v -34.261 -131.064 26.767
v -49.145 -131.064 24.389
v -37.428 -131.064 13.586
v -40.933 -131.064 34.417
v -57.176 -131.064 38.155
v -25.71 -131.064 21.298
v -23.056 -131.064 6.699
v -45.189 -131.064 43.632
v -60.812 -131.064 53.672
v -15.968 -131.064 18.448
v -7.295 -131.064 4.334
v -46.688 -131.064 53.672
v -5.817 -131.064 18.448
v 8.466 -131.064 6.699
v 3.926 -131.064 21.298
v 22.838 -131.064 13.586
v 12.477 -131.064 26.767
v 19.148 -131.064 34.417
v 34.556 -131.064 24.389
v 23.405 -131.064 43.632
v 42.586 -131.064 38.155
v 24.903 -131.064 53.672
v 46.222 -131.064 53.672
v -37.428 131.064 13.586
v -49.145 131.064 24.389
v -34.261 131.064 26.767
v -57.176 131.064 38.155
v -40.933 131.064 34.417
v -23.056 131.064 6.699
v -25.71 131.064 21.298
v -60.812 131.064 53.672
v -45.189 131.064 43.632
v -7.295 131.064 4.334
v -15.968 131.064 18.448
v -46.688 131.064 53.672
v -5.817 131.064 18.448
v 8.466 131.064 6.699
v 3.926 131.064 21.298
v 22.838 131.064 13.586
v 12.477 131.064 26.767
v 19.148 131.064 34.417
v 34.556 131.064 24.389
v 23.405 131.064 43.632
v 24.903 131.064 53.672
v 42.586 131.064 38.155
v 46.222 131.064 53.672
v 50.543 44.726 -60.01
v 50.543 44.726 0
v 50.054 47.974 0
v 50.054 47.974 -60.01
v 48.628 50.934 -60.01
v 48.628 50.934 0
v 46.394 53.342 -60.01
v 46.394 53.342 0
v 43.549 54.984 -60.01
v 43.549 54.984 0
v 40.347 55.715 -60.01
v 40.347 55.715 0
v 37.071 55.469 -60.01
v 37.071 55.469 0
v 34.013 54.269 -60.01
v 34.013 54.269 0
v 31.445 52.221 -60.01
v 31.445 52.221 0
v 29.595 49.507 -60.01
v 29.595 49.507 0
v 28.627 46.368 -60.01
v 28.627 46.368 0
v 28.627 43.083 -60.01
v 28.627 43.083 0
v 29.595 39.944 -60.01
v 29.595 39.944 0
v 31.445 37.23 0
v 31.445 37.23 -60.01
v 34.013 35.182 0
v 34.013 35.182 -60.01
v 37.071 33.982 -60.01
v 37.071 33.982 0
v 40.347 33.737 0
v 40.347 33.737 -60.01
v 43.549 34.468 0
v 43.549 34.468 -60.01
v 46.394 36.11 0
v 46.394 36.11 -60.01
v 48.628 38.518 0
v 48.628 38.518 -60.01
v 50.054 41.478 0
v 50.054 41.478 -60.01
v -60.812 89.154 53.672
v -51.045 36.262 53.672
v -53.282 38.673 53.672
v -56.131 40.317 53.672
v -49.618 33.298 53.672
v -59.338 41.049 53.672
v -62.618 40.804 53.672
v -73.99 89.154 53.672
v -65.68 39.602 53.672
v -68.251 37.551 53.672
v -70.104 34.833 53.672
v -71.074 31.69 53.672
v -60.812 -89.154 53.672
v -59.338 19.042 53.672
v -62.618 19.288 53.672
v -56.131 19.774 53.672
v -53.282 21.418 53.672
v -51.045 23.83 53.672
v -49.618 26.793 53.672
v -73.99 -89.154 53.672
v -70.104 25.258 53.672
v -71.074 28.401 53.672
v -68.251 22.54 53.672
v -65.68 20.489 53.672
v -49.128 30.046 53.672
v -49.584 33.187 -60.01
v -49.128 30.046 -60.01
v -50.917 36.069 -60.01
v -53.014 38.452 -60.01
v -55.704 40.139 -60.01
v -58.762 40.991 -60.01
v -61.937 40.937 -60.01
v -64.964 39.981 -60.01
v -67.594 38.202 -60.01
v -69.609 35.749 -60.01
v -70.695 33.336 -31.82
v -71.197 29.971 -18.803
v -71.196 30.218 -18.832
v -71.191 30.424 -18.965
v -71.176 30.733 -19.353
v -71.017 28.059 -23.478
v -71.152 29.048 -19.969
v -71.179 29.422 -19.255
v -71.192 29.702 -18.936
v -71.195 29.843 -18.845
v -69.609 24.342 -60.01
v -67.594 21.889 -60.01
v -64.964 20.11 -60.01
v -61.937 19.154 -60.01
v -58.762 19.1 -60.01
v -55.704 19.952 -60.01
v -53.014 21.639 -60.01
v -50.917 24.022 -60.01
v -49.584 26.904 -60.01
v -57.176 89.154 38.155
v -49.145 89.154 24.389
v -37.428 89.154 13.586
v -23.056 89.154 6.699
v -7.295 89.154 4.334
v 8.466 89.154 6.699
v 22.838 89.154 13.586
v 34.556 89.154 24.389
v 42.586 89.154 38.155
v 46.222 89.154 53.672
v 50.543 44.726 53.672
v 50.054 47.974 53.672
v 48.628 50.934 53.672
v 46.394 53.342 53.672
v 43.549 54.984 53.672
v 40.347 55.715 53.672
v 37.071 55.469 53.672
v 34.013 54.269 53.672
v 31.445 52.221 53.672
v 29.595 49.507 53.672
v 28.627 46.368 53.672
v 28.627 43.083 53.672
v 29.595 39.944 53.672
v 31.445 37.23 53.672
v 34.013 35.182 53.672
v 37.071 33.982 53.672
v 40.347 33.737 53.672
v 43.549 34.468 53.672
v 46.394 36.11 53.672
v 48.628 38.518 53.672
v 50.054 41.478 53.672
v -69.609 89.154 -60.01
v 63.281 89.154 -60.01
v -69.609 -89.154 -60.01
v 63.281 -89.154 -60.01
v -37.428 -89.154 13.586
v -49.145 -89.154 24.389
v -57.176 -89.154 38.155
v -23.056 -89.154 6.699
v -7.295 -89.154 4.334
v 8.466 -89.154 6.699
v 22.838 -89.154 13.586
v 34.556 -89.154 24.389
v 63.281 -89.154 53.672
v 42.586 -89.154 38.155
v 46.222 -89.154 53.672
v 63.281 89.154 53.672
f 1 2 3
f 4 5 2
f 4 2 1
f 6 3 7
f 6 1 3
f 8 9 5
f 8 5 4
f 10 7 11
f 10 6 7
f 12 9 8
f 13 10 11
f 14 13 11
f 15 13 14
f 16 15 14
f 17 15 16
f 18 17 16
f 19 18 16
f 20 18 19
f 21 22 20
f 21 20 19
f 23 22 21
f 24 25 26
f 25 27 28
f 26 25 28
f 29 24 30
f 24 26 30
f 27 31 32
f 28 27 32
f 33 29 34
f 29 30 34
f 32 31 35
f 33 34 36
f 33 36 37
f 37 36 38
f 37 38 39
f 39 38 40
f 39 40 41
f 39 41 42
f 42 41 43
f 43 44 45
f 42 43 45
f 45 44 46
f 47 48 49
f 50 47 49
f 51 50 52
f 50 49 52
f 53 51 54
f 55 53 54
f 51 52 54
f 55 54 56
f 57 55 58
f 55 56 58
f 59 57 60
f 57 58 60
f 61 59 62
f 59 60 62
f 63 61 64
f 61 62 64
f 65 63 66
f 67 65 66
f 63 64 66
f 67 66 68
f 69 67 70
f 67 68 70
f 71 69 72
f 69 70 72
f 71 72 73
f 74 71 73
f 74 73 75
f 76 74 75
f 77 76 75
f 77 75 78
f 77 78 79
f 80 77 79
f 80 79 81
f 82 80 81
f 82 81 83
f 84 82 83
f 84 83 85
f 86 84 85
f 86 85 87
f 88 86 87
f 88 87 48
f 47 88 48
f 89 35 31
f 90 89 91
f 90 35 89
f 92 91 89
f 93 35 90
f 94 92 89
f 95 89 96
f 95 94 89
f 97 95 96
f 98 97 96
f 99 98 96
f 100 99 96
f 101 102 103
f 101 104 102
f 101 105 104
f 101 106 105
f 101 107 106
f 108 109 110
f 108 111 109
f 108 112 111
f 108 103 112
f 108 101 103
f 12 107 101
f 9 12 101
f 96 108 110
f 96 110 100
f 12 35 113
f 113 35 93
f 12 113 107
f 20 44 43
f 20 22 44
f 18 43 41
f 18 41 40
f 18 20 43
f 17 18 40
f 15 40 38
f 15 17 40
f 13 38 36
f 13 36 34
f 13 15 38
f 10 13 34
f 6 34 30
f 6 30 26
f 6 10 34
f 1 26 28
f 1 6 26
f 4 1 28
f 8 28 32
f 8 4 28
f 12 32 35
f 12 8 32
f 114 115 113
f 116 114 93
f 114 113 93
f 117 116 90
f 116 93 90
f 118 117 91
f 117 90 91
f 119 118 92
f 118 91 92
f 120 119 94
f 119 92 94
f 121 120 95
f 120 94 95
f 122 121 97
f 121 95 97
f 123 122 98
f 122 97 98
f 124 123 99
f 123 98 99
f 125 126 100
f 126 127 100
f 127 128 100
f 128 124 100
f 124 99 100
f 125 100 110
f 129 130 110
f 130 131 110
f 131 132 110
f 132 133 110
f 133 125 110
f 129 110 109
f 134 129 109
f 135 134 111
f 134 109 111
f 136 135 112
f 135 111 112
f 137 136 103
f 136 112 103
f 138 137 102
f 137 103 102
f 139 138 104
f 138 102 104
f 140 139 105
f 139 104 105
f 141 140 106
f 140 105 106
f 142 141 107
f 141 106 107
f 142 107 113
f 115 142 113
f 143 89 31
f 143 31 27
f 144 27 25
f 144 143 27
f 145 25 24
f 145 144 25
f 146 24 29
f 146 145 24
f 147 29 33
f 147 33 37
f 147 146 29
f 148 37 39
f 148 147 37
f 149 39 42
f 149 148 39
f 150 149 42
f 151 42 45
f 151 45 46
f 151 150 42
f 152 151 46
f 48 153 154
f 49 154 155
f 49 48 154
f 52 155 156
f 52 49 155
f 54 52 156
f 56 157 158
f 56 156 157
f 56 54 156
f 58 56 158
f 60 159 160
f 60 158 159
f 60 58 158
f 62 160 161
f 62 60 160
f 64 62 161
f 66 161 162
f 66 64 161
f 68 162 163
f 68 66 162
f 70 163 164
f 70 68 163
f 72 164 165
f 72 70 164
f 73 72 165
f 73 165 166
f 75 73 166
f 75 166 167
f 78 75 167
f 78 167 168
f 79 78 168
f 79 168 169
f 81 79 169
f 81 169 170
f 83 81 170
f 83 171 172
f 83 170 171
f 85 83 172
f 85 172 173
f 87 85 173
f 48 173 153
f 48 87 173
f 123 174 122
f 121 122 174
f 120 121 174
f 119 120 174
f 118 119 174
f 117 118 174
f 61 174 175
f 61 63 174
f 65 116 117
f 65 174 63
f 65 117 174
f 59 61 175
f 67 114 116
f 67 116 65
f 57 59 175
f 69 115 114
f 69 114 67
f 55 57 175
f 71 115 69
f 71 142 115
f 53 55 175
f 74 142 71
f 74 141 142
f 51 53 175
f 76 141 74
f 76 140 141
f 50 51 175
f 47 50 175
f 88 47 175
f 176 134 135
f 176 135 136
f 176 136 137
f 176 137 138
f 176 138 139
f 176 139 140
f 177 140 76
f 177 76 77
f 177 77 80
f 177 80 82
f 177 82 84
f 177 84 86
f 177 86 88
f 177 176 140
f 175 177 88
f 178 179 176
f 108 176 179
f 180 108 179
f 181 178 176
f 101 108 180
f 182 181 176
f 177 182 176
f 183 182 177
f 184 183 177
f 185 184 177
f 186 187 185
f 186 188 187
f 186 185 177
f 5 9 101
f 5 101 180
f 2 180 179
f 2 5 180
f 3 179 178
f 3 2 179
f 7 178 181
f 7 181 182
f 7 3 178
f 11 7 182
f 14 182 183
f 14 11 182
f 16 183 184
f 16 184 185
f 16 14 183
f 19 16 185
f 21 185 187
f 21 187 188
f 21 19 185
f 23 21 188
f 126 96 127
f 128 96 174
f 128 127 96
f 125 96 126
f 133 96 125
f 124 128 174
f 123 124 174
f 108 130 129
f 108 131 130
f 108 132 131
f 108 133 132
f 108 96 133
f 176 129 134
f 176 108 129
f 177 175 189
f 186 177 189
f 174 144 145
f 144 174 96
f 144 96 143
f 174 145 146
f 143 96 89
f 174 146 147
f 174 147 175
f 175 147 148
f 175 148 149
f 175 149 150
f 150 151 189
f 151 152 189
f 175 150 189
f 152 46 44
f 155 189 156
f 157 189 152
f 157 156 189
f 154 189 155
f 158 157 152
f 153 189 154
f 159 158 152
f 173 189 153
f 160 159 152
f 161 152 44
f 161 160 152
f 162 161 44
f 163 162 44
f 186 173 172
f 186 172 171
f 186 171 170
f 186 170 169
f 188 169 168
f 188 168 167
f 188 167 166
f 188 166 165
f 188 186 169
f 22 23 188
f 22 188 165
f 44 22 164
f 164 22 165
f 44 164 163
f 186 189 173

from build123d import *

# Parameters (mm, degrees)
F1_DEPTH = 89.154
F2_DEPTH = 131.064
F3_R     = 11.0199394835
F4_DEPTH = 25.4
F3_R_2   = 11.0346787259
F5_DEPTH = 138.938


with BuildPart() as f1:
    # F0 (on Front) → F1 (new body, symmetric)
    with BuildSketch(Plane.XZ):
        with BuildLine():
            Line((-73.9898234606, 53.6717362702), (-69.6088522673, -60.0099079311))
            Line((-69.6088522673, -60.0099079311), (63.2807761431, -60.0099079311))
            Line((63.2807761431, -60.0099079311), (63.2807761431, 53.6717362702))
            Line((63.2807761431, 53.6717362702), (46.2222844362, 53.6717362702))
            ThreePointArc((46.2222844362, 53.6717362702), (-7.294902578, 4.3339080113), (-60.8120895922, 53.6717362702))
            Line((-60.8120895922, 53.6717362702), (-73.9898234606, 53.6717362702))
        make_face()
        with BuildLine():
            Line((-46.6877035797, 53.6717362702), (-60.8120895922, 53.6717362702))
            ThreePointArc((-60.8120895922, 53.6717362702), (-7.294902578, 4.3339080113), (46.2222844362, 53.6717362702))
            Line((46.2222844362, 53.6717362702), (24.9031372368, 53.6717362702))
            ThreePointArc((24.9031372368, 53.6717362702), (-10.8922831714, 18.0866857546), (-46.6877035797, 53.6717362702))
        make_face()
    extrude(amount=F1_DEPTH, both=True)

    # F0 (on Front) → F2 (join, symmetric)
    with BuildSketch(Plane.XZ):
        with BuildLine():
            Line((-46.6877035797, 53.6717362702), (-60.8120895922, 53.6717362702))
            ThreePointArc((-60.8120895922, 53.6717362702), (-7.294902578, 4.3339080113), (46.2222844362, 53.6717362702))
            Line((46.2222844362, 53.6717362702), (24.9031372368, 53.6717362702))
            ThreePointArc((24.9031372368, 53.6717362702), (-10.8922831714, 18.0866857546), (-46.6877035797, 53.6717362702))
        make_face()
    extrude(amount=F2_DEPTH, both=True)


with BuildPart() as f4:
    # F3 (on Top) → F4 (new body)
    with BuildSketch(Plane.XY):
        with Locations((39.523396641, 44.7258390486)):
            Circle(F3_R)
    extrude(amount=F4_DEPTH)


with BuildPart() as f4b:
    # F3 (on Top) → F4, piece 2 (new body)
    with BuildSketch(Plane.XY):
        with Locations((-60.1624064147, 30.0455577672)):
            Circle(F3_R_2)
    extrude(amount=F4_DEPTH)


with BuildPart() as f5_tool:
    # F3 (on Top) → F5 (new body, symmetric)
    with BuildSketch(Plane.XY):
        with Locations((39.523396641, 44.7258390486)):
            Circle(F3_R)
        with Locations((-60.1624064147, 30.0455577672)):
            Circle(F3_R_2)
    extrude(amount=F5_DEPTH, both=True)


with BuildPart() as f1_1:
    add(f1.part)

    # F5: cut by f5_tool
    add(f5_tool.part, mode=Mode.SUBTRACT)


with BuildPart() as f4_1:
    add(f4.part)

    # F5: cut by f5_tool
    add(f5_tool.part, mode=Mode.SUBTRACT)


with BuildPart() as f4b_1:
    add(f4b.part)

    # F5: cut by f5_tool
    add(f5_tool.part, mode=Mode.SUBTRACT)


solid = f1_1.part
